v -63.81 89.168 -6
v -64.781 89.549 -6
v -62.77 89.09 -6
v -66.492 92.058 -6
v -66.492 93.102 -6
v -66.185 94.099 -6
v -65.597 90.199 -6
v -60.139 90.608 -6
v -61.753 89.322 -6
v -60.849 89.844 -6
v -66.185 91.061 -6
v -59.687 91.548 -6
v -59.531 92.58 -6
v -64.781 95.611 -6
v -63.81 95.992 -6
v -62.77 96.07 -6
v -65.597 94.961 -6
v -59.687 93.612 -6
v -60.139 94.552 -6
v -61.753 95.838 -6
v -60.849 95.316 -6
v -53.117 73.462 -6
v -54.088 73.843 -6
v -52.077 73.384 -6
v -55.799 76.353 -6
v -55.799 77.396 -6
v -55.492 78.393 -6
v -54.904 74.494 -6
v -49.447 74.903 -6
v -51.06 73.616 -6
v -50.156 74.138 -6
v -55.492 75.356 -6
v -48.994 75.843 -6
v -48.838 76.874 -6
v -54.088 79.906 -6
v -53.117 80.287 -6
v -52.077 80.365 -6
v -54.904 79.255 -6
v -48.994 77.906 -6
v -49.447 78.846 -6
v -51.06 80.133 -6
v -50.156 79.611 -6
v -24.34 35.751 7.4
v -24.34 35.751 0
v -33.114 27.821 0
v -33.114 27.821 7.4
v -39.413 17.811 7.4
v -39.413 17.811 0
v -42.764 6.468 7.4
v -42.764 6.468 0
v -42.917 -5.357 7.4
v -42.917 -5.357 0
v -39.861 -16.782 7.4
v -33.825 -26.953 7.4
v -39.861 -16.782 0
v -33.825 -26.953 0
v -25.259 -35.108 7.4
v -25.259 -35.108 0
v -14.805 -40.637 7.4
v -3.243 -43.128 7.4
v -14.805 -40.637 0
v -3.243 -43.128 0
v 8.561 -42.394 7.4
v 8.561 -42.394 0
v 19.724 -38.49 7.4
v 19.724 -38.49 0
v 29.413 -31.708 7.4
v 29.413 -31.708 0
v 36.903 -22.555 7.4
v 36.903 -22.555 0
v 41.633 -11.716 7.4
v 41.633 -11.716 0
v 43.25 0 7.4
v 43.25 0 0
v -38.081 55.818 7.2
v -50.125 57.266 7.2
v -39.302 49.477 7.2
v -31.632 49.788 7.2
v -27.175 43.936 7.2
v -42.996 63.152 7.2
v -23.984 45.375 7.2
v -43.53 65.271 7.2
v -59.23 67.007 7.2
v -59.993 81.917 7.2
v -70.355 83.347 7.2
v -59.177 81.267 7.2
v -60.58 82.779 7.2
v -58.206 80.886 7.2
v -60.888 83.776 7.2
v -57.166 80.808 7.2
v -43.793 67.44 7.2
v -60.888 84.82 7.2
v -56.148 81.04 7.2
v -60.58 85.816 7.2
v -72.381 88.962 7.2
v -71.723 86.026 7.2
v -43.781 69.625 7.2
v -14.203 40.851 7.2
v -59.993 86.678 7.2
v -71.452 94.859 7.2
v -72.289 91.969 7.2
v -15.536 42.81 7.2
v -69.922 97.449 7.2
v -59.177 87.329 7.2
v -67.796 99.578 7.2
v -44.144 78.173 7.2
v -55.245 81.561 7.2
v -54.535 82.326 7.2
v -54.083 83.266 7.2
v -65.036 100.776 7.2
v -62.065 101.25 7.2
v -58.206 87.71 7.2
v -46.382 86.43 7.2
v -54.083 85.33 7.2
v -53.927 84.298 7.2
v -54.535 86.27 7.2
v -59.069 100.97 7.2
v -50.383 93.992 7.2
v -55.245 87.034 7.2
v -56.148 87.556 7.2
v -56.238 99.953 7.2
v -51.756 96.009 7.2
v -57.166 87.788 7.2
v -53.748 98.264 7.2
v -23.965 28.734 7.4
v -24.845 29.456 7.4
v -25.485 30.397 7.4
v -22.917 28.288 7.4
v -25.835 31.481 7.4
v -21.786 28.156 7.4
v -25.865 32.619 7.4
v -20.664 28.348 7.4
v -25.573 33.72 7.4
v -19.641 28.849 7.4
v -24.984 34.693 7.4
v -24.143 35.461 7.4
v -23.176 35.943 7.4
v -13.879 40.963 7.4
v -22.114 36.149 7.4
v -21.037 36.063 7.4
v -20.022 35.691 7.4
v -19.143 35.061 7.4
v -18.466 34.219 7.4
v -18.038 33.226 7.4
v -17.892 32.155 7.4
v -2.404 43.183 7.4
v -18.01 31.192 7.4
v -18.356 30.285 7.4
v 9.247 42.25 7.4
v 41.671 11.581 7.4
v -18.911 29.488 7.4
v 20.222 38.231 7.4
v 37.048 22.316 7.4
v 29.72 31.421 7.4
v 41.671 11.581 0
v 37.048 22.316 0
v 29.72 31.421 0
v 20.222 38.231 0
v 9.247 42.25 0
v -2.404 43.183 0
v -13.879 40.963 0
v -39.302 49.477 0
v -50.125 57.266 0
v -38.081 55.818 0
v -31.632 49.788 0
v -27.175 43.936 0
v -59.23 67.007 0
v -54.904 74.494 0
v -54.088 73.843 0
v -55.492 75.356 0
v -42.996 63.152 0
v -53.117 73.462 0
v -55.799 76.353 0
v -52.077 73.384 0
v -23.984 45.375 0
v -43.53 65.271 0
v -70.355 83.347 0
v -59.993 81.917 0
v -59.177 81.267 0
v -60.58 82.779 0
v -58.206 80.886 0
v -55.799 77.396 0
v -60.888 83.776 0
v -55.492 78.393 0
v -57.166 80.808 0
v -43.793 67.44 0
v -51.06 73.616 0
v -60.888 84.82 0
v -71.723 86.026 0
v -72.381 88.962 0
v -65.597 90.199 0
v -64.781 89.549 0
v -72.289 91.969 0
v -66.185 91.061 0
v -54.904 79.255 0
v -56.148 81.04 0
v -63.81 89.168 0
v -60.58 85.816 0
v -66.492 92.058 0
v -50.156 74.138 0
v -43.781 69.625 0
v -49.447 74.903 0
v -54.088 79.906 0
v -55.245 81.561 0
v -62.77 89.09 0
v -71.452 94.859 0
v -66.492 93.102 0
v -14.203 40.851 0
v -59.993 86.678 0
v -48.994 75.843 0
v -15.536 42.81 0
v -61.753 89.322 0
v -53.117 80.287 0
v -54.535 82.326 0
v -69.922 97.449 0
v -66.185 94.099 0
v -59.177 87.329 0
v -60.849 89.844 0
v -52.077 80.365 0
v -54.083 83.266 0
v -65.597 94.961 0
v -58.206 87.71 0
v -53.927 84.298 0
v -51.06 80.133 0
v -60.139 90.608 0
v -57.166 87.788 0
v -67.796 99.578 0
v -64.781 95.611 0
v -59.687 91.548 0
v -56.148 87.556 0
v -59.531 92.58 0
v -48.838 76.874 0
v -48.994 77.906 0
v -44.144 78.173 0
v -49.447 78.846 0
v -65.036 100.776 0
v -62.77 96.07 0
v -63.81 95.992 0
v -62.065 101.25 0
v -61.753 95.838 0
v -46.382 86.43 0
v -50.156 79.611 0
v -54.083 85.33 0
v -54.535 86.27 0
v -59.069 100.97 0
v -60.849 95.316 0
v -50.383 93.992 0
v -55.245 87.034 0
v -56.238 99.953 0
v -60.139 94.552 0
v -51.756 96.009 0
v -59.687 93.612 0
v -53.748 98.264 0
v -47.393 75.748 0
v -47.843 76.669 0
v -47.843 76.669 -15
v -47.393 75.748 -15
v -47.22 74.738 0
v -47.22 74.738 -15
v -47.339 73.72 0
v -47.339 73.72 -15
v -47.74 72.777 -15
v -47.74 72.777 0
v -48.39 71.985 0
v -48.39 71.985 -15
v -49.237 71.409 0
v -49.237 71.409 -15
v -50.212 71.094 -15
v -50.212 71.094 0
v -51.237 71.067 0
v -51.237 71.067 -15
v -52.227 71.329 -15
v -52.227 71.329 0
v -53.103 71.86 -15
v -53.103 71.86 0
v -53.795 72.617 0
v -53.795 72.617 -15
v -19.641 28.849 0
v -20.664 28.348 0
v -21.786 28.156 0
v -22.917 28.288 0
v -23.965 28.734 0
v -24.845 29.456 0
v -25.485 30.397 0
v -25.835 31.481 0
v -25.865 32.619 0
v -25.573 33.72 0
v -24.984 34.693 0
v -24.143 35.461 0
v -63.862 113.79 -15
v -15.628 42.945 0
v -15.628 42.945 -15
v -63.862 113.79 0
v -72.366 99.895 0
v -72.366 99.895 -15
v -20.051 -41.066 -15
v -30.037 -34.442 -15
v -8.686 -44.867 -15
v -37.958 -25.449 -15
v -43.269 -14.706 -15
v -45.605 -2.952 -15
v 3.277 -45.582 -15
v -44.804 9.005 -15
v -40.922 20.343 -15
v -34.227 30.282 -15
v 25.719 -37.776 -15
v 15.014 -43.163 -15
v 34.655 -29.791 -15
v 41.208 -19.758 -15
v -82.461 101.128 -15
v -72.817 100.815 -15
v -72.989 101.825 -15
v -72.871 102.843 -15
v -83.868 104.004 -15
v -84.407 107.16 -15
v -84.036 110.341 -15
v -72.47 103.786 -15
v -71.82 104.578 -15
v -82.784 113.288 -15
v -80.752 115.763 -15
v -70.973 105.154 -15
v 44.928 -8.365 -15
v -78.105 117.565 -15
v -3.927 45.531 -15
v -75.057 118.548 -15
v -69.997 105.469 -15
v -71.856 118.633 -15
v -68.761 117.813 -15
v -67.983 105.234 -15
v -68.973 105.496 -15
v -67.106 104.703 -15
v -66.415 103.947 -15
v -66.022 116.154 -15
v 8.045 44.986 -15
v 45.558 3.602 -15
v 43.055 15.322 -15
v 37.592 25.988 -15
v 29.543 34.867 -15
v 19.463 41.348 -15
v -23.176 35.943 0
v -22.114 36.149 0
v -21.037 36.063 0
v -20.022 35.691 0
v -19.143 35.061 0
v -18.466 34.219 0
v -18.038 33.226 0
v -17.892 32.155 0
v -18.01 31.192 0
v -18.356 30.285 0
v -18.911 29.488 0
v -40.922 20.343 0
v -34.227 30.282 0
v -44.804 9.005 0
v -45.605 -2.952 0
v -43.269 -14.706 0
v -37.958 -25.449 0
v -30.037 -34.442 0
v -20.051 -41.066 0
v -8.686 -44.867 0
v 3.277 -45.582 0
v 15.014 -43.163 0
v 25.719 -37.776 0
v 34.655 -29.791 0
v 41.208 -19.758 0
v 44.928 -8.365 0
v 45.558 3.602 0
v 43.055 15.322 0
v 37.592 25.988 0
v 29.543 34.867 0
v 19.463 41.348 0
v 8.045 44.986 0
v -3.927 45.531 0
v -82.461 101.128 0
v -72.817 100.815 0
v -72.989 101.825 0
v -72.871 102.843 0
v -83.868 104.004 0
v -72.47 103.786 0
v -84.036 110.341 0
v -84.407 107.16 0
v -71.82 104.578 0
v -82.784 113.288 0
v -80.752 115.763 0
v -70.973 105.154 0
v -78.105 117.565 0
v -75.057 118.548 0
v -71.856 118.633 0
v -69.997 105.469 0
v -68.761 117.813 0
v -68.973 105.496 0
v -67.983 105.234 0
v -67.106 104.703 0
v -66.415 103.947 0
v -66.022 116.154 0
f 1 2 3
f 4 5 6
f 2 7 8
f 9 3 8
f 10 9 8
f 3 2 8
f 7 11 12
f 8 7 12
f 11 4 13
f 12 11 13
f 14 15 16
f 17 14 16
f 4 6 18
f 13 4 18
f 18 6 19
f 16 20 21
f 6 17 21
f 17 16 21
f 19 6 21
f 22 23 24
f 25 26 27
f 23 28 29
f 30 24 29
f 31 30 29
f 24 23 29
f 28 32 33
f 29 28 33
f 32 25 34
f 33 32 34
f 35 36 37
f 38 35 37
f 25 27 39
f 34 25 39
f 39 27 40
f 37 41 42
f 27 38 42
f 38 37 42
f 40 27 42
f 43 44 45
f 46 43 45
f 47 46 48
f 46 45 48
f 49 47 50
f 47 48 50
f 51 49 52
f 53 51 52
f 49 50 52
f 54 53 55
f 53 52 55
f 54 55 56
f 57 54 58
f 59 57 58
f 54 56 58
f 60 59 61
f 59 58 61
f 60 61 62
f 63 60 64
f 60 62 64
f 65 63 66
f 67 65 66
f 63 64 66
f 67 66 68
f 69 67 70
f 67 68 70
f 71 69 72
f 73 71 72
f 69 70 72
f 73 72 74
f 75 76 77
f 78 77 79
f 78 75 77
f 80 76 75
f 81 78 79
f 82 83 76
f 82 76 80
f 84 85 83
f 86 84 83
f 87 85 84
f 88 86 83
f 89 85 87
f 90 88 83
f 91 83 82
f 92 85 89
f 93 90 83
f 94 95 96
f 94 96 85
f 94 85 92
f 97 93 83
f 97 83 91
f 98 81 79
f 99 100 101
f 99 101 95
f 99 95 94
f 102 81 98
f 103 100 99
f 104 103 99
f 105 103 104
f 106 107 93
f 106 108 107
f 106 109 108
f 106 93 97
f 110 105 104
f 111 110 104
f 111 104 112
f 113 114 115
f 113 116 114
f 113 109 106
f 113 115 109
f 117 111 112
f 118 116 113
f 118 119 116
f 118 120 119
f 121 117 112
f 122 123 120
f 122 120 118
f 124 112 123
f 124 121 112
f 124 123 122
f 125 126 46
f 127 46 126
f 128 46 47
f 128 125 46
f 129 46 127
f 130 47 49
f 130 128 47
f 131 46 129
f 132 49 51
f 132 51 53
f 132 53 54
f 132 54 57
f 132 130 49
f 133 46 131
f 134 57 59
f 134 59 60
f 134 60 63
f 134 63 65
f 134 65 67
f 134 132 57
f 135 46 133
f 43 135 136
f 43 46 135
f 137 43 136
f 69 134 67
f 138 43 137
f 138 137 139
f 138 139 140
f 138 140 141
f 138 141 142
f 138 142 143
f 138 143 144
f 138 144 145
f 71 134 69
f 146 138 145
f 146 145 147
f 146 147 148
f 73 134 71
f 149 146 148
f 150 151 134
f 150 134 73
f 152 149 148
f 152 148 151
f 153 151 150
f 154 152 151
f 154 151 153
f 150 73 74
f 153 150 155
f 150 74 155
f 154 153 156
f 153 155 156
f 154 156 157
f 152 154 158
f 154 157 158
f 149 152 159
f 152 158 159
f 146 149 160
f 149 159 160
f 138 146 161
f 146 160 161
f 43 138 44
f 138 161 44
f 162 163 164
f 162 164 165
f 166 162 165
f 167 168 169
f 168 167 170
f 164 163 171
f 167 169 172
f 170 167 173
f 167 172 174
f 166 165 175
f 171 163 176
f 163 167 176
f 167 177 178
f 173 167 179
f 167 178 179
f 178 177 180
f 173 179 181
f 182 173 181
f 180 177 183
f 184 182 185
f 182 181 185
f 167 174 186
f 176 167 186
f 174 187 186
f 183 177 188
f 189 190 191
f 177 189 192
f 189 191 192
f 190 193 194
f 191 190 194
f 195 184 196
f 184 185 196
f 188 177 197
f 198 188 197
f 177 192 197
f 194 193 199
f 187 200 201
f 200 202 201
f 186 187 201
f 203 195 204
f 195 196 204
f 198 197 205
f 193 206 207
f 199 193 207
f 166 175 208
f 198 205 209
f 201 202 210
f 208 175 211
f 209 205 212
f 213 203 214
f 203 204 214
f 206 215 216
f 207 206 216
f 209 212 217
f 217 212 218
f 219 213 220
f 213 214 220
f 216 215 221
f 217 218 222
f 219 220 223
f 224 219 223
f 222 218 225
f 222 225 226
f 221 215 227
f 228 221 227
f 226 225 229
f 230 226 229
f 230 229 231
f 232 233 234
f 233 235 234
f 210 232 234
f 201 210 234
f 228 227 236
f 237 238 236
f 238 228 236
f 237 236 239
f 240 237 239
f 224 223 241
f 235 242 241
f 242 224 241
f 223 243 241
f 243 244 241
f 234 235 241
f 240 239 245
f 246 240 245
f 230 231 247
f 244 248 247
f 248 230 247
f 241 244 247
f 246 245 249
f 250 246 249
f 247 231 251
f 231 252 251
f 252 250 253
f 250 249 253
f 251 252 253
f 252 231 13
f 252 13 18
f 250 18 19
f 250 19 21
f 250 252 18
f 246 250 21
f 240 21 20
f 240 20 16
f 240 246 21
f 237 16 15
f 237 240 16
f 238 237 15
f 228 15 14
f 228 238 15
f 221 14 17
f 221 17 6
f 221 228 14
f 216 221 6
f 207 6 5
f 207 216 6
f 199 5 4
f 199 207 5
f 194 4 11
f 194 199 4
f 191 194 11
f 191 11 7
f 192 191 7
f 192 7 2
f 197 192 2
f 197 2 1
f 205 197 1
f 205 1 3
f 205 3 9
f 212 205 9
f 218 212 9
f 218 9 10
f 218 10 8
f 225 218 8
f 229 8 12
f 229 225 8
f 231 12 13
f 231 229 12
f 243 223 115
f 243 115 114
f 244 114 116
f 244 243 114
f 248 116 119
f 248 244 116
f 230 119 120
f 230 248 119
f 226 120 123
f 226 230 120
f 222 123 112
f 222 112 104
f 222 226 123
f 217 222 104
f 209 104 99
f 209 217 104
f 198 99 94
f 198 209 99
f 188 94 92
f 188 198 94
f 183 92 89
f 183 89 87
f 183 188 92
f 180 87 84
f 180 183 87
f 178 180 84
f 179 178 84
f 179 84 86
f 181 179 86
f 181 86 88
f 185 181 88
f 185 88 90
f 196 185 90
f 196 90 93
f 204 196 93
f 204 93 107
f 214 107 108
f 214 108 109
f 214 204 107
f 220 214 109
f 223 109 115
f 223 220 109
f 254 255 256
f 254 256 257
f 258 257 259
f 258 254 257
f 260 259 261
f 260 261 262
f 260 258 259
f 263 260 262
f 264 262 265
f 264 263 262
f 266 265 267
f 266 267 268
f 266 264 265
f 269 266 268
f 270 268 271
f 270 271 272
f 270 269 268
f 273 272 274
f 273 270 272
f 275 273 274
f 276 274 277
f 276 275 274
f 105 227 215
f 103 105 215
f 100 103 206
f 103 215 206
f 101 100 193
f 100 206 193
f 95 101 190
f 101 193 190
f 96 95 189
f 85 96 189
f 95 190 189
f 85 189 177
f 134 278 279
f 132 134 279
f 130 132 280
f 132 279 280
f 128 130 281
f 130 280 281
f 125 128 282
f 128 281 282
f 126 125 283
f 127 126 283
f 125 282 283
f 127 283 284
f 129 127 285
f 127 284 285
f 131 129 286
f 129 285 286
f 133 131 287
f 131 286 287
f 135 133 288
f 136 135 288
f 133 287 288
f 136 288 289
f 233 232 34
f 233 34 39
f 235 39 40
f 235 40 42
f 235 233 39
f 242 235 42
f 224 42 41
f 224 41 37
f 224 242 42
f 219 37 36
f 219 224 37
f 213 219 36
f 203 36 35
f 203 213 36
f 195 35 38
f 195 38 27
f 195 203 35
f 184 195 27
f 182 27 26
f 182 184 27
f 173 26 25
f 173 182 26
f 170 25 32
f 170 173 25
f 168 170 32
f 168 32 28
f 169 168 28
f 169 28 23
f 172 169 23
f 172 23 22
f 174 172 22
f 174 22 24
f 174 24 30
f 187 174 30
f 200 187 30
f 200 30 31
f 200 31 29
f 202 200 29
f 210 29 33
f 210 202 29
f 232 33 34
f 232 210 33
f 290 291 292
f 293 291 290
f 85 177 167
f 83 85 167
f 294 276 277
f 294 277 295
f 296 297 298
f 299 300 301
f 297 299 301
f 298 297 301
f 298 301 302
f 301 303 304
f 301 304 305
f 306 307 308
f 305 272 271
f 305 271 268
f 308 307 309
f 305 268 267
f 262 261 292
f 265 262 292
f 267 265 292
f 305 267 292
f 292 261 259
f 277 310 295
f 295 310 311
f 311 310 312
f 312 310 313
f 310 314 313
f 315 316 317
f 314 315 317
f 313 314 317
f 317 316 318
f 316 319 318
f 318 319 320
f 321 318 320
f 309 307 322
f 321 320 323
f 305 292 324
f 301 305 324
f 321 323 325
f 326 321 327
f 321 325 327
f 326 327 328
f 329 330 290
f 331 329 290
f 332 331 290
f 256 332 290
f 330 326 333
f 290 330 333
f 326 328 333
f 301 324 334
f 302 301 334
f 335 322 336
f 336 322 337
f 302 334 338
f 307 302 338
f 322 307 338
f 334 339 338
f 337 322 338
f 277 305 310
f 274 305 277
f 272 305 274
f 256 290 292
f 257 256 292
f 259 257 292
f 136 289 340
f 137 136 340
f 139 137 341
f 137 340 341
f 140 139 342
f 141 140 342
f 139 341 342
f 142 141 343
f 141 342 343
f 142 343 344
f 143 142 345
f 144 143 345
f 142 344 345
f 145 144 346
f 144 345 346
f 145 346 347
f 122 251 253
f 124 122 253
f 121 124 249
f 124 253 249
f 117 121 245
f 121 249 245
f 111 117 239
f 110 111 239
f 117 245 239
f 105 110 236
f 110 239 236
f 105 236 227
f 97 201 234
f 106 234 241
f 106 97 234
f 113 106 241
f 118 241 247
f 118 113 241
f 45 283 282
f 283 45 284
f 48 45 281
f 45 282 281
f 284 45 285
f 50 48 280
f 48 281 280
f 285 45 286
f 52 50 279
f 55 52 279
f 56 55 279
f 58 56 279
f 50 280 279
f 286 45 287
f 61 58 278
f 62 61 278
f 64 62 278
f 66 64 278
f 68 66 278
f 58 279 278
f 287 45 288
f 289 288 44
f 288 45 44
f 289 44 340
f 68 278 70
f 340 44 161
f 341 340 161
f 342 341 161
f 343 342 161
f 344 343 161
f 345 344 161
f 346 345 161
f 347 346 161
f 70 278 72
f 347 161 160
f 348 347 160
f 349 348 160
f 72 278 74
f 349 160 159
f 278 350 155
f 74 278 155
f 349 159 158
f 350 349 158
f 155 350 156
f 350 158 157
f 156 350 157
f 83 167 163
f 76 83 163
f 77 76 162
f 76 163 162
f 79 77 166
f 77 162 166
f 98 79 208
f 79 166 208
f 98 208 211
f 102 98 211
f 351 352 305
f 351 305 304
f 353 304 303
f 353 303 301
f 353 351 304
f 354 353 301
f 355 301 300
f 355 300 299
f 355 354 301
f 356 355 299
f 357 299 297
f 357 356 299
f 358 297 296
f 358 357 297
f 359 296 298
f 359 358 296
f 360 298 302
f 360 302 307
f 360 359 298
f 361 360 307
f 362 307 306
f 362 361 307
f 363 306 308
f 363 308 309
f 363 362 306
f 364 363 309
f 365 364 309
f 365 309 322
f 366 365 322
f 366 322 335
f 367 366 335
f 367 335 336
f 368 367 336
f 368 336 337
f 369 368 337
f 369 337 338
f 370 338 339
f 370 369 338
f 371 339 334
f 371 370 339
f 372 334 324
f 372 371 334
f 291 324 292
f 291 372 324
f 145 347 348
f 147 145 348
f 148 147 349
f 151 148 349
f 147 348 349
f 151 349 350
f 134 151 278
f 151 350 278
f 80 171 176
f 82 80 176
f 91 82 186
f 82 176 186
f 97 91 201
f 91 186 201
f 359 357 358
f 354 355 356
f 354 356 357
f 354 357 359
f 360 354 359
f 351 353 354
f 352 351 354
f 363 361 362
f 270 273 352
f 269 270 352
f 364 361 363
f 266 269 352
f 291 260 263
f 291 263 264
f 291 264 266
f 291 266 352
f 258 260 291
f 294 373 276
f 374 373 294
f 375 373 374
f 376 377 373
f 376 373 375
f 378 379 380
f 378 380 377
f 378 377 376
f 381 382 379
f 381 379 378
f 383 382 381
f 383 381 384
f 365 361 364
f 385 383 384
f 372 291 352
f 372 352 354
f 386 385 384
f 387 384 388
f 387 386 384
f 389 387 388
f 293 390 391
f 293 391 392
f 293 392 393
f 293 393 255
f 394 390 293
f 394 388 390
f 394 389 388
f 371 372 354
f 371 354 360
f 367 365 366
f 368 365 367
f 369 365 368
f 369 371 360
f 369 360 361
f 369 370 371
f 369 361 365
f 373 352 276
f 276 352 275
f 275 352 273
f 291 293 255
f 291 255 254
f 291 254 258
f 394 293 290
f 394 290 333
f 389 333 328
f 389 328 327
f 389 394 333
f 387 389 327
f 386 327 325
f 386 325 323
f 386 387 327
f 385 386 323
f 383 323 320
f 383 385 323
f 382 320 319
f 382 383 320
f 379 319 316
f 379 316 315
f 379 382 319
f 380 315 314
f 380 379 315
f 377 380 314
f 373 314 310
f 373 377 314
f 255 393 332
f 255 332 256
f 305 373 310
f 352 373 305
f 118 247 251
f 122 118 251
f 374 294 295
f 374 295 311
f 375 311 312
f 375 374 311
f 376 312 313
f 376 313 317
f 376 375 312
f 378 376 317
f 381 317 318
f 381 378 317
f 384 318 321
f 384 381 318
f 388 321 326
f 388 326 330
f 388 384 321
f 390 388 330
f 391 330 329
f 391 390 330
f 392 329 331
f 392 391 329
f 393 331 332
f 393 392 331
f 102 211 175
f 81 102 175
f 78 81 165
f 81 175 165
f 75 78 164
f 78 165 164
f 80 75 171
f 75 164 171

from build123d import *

# Parameters (mm, degrees)
F1_DEPTH = 15
F3_DEPTH = 7.4
F4_R     = 3.5
F5_DEPTH = 7.2
F6_DEPTH = 6
F7_DEPTH = 25
F8_R     = 38.5986647281


with BuildPart() as f1:
    # F0 (on Top) → F1 (new body)
    with BuildSketch(Plane.XY):
        with BuildLine():
            Line((-82.4606558202, 101.127655672), (-34.2268855042, 30.2821780703))
            ThreePointArc((-34.2268855042, 30.2821780703), (25.7190199287, -37.7759449108), (-15.6282255372, 42.9447152344))
            Line((-15.6282255372, 42.9447152344), (-63.8619958531, 113.790192836))
            ThreePointArc((-63.8619958531, 113.790192836), (-79.4925944186, 116.7582542375), (-82.4606558202, 101.127655672))
        make_face()
        with BuildLine():
            Line((-66.4149180642, 103.9466625656), (-47.8431968903, 76.6686279473))
            ThreePointArc((-47.8431968903, 76.6686279473), (-48.7929760943, 71.6668367089), (-53.7947674745, 72.6166151659))
            Line((-53.7947674745, 72.6166151659), (-72.3664967968, 99.8946442365))
            ThreePointArc((-72.3664967968, 99.8946442365), (-71.4167168976, 104.8964432118), (-66.4149180642, 103.9466625656))
        make_face(mode=Mode.SUBTRACT)
    extrude(amount=-F1_DEPTH)

    # F4 (on Top) → F7 (cut)
    with BuildSketch(Plane.XY):
        with BuildLine():
            ThreePointArc((-32.8016889476, 28.1888577666), (-24.3402103264, 35.7507574922), (-14.2030289806, 40.8513949306))
            ThreePointArc((-14.2030289806, 40.8513949306), (-39.302455448, 49.4773903569), (-59.2300941192, 67.0067435418))
            Line((-59.2300941192, 67.0067435418), (-32.8016889476, 28.1888577666))
        make_face()
        with BuildLine():
            ThreePointArc((-42.9959079664, 63.1521523853), (-31.6316767282, 49.787714397), (-15.5362989507, 42.8096940058))
            Line((-15.5362989507, 42.8096940058), (-40.2015814001, 79.0379155166))
            ThreePointArc((-40.2015814001, 79.0379155166), (-43.5597045958, 71.4399693711), (-42.9959079664, 63.1521523853))
        make_face()
    extrude(amount=F7_DEPTH, mode=Mode.SUBTRACT)


with BuildPart() as f3:
    # F2 (on Top) → F3 (new body)
    with BuildSketch(Plane.XY):
        with BuildLine():
            ThreePointArc((-24.3401946346, 35.7507681756), (-20.221882727, -38.2313740137), (43.25, 0))
            ThreePointArc((43.25, 0), (20.221882727, 38.2313740137), (-24.3401946346, 35.7507681756))
        make_face()
        with BuildLine():
            ThreePointArc((-19.6409843364, 28.8486002138), (-25.1985308083, 29.9039092742), (-24.1432217479, 35.4614557461))
            ThreePointArc((-24.1432217479, 35.4614557461), (-20.0218724177, 35.6908782895), (-17.8921030421, 32.15502798))
            ThreePointArc((-17.8921030421, 32.15502798), (-18.3562527326, 30.2847973556), (-19.6409843364, 28.8486002138))
        make_face(mode=Mode.SUBTRACT)
    extrude(amount=F3_DEPTH)


with BuildPart() as f5:
    # F4 (on Top) → F5 (new body)
    with BuildSketch(Plane.XY):
        with BuildLine():
            ThreePointArc((-59.2300941192, 67.0067435418), (-39.302455448, 49.4773903569), (-14.2030289806, 40.8513949306))
            Line((-14.2030289806, 40.8513949306), (-15.5362989507, 42.8096940058))
            ThreePointArc((-15.5362989507, 42.8096940058), (-31.6316767282, 49.787714397), (-42.9959079664, 63.1521523853))
            ThreePointArc((-42.9959079664, 63.1521523853), (-43.5597045958, 71.4399693711), (-40.2015814001, 79.0379155166))
            Line((-40.2015814001, 79.0379155166), (-51.7562156675, 96.009294238))
            ThreePointArc((-51.7562156675, 96.009294238), (-59.0693463715, 100.9695211574), (-67.7956957561, 99.577918411))
            ThreePointArc((-67.7956957561, 99.577918411), (-72.2891545839, 91.969070959), (-70.3548756346, 83.3467570739))
            Line((-70.3548756346, 83.3467570739), (-59.2300941192, 67.0067435418))
        make_face()
        with Locations((-52.3384835372, 76.874463517)):
            Circle(F4_R, mode=Mode.SUBTRACT)
        with Locations((-63.0312973894, 92.5799954062)):
            Circle(F4_R, mode=Mode.SUBTRACT)
        with Locations((-57.4270605157, 84.2978808781)):
            Circle(F4_R, mode=Mode.SUBTRACT)
        with Locations((-63.0312973894, 92.5799954062)):
            Circle(F4_R)
        with Locations((-52.3384835372, 76.874463517)):
            Circle(F4_R)
    extrude(amount=F5_DEPTH)

    # F4 (on Top) → F6 (join)
    with BuildSketch(Plane.XY):
        with Locations((-63.0312973894, 92.5799954062)):
            Circle(F4_R)
        with Locations((-52.3384835372, 76.874463517)):
            Circle(F4_R)
    extrude(amount=-F6_DEPTH)

    # F8
    f8_edges = [f5.edges().sort_by_distance(p)[0] for p in [
        (-40.201581, 79.037916, 3.6),
    ]]
    fillet(f8_edges, radius=F8_R)


solid = Compound([f1.part, f3.part, f5.part])
